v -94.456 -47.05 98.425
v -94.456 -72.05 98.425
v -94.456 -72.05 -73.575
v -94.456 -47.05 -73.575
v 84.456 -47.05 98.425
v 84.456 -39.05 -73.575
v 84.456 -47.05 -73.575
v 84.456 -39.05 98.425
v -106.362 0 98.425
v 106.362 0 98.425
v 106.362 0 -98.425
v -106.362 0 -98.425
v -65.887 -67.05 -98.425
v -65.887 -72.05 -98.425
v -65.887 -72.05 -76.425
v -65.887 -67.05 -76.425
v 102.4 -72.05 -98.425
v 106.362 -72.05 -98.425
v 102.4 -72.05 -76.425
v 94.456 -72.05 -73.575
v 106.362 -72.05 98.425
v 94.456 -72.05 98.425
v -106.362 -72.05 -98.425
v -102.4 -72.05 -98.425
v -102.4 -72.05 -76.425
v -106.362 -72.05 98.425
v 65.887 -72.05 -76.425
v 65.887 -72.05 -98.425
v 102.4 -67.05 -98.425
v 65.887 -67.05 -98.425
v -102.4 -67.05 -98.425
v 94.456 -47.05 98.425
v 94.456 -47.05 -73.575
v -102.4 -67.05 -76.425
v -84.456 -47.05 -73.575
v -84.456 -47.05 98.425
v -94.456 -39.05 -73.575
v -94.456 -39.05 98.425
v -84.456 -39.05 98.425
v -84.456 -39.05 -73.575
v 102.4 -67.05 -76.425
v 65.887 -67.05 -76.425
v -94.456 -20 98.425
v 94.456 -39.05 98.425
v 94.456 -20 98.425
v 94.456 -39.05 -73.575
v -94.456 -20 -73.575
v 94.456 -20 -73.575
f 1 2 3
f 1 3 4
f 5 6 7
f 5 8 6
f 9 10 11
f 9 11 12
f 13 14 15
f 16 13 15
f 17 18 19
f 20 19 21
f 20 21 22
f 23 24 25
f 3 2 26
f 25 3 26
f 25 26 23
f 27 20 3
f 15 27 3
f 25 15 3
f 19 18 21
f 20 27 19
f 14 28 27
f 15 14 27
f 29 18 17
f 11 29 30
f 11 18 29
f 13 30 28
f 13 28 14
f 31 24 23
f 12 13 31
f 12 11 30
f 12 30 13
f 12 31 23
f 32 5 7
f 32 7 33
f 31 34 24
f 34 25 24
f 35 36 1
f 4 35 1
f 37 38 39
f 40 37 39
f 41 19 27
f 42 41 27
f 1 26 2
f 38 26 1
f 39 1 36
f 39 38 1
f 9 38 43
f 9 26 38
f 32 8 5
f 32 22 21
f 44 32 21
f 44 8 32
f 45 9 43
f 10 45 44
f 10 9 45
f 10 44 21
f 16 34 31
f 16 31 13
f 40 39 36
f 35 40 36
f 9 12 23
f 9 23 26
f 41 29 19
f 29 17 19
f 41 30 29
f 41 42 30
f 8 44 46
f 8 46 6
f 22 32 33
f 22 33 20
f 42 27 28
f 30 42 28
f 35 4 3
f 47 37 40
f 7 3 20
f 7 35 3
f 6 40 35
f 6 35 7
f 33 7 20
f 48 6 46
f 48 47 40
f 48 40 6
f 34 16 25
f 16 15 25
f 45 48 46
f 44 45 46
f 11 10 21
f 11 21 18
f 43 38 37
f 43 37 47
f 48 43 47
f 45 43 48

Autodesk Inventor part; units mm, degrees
ref_plane "YZ Plane" through (0, 0, 0) normal (1, 0, 0) x (0, 1, 0)
ref_plane "XZ Plane" through (0, 0, 0) normal (0, 1, 0) x (-1, 0, 0)
ref_plane "XY Plane" through (0, 0, 0) normal (0, 0, 1) x (1, 0, 0)
sketch "Sketch1" plane through (0, 0, 0) normal (0, 1, 0) x (-1, 0, 0)
  line L0 (-106.3625, -98.425) -> (106.3625, -98.425)
  line L1 (106.3625, -98.425) -> (106.3625, 98.425)
  line L2 (106.3625, 98.425) -> (-106.3625, 98.425)
  line L3 (-106.3625, 98.425) -> (-106.3625, -98.425)
  line L4 (-106.3625, -98.425) -> (106.3625, 98.425) construction
  line L5 (106.3625, -98.425) -> (-106.3625, 98.425) construction
  point P0 (0, 0)
  dimension "d0" = 212.725
  dimension "d1" = 196.85
extrude "Extrusion1" add sketch "Sketch1" against normal blind 72.05
sketch "Sketch2" plane through (-106.3625, 0, 98.425) normal (0, 0, 1) x (1, 0, 0)
  line L0 (0, -72.05) -> (212.725, -72.05) projected
  line L1 (11.906, -20) -> (200.819, -20)
  line L2 (200.819, -20) -> (200.819, -72.05)
  line L3 (200.819, -72.05) -> (11.906, -72.05)
  line L4 (11.906, -72.05) -> (11.906, -20)
  line L5 (0, 0) -> (212.725, 0) projected
  line L6 (0, 0) -> (0, -72.05) projected
  line L7 (212.725, 0) -> (212.725, -72.05) projected
  point P0 (106.3625, 0)
  point P1 (0, -36.025)
  point P2 (212.725, -36.025)
  dimension "d4" = 20
  dimension "d5" = 188.913
  dimension "d6" = 11.906
  dimension "d7" = 11.906
extrude "Extrusion2" cut sketch "Sketch2" against normal blind 172 contours L4 L1 L2 L0
sketch "Sketch3" plane through (-106.3625, 0, 98.425) normal (0, 0, 1) x (1, 0, 0)
  line L0 (11.906, -72.05) -> (11.906, -20) projected
  line L1 (11.906, -39.05) -> (21.906, -39.05)
  line L2 (21.906, -39.05) -> (21.906, -47.05)
  line L3 (21.906, -47.05) -> (11.906, -47.05)
  line L4 (11.906, -47.05) -> (11.906, -39.05)
  line L5 (200.819, -20) -> (200.819, -72.05) projected
  line L6 (200.819, -39.05) -> (190.819, -39.05)
  line L7 (190.819, -39.05) -> (190.819, -47.05)
  line L8 (190.819, -47.05) -> (200.819, -47.05)
  line L9 (200.819, -47.05) -> (200.819, -39.05)
  line L10 (11.906, -20) -> (200.819, -20) projected
  point P0 (106.3625, 0)
  point P1 (16.906, -39.05)
  point P2 (11.906, -47.05)
  dimension "d10" = 10
  dimension "d11" = 10
  dimension "d12" = 19.05
  dimension "d13" = 8
extrude "Extrusion3" add sketch "Sketch3" against normal blind 172
sketch "Sketch4" plane through (0, -72.05, 0) normal (0, -1, 0) x (1, 0, 0)
  line L0 (-106.3625, -98.425) -> (106.3625, -98.425) projected
  line L1 (-102.4, -98.425) -> (-65.887, -98.425)
  line L2 (-65.887, -98.425) -> (-65.887, -76.425)
  line L3 (-65.887, -76.425) -> (-102.4, -76.425)
  line L4 (-102.4, -76.425) -> (-102.4, -98.425)
  line L5 (65.887, -98.425) -> (102.4, -98.425)
  line L6 (102.4, -98.425) -> (102.4, -76.425)
  line L7 (102.4, -76.425) -> (65.887, -76.425)
  line L8 (65.887, -76.425) -> (65.887, -98.425)
  line L9 (-106.3625, 98.425) -> (-106.3625, -98.425) projected
  point P0 (0, 0)
  point P1 (102.4, -87.425)
  point P2 (65.887, -87.425)
  dimension "d16" = 36.513
  dimension "d17" = 36.513
  dimension "d18" = 22
  dimension "d19" = 22
  dimension "d20" = 131.774
  dimension "d21" = 3.9625
extrude "Extrusion4" cut sketch "Sketch4" against normal blind 5
properties material "Wood (Maple)"
